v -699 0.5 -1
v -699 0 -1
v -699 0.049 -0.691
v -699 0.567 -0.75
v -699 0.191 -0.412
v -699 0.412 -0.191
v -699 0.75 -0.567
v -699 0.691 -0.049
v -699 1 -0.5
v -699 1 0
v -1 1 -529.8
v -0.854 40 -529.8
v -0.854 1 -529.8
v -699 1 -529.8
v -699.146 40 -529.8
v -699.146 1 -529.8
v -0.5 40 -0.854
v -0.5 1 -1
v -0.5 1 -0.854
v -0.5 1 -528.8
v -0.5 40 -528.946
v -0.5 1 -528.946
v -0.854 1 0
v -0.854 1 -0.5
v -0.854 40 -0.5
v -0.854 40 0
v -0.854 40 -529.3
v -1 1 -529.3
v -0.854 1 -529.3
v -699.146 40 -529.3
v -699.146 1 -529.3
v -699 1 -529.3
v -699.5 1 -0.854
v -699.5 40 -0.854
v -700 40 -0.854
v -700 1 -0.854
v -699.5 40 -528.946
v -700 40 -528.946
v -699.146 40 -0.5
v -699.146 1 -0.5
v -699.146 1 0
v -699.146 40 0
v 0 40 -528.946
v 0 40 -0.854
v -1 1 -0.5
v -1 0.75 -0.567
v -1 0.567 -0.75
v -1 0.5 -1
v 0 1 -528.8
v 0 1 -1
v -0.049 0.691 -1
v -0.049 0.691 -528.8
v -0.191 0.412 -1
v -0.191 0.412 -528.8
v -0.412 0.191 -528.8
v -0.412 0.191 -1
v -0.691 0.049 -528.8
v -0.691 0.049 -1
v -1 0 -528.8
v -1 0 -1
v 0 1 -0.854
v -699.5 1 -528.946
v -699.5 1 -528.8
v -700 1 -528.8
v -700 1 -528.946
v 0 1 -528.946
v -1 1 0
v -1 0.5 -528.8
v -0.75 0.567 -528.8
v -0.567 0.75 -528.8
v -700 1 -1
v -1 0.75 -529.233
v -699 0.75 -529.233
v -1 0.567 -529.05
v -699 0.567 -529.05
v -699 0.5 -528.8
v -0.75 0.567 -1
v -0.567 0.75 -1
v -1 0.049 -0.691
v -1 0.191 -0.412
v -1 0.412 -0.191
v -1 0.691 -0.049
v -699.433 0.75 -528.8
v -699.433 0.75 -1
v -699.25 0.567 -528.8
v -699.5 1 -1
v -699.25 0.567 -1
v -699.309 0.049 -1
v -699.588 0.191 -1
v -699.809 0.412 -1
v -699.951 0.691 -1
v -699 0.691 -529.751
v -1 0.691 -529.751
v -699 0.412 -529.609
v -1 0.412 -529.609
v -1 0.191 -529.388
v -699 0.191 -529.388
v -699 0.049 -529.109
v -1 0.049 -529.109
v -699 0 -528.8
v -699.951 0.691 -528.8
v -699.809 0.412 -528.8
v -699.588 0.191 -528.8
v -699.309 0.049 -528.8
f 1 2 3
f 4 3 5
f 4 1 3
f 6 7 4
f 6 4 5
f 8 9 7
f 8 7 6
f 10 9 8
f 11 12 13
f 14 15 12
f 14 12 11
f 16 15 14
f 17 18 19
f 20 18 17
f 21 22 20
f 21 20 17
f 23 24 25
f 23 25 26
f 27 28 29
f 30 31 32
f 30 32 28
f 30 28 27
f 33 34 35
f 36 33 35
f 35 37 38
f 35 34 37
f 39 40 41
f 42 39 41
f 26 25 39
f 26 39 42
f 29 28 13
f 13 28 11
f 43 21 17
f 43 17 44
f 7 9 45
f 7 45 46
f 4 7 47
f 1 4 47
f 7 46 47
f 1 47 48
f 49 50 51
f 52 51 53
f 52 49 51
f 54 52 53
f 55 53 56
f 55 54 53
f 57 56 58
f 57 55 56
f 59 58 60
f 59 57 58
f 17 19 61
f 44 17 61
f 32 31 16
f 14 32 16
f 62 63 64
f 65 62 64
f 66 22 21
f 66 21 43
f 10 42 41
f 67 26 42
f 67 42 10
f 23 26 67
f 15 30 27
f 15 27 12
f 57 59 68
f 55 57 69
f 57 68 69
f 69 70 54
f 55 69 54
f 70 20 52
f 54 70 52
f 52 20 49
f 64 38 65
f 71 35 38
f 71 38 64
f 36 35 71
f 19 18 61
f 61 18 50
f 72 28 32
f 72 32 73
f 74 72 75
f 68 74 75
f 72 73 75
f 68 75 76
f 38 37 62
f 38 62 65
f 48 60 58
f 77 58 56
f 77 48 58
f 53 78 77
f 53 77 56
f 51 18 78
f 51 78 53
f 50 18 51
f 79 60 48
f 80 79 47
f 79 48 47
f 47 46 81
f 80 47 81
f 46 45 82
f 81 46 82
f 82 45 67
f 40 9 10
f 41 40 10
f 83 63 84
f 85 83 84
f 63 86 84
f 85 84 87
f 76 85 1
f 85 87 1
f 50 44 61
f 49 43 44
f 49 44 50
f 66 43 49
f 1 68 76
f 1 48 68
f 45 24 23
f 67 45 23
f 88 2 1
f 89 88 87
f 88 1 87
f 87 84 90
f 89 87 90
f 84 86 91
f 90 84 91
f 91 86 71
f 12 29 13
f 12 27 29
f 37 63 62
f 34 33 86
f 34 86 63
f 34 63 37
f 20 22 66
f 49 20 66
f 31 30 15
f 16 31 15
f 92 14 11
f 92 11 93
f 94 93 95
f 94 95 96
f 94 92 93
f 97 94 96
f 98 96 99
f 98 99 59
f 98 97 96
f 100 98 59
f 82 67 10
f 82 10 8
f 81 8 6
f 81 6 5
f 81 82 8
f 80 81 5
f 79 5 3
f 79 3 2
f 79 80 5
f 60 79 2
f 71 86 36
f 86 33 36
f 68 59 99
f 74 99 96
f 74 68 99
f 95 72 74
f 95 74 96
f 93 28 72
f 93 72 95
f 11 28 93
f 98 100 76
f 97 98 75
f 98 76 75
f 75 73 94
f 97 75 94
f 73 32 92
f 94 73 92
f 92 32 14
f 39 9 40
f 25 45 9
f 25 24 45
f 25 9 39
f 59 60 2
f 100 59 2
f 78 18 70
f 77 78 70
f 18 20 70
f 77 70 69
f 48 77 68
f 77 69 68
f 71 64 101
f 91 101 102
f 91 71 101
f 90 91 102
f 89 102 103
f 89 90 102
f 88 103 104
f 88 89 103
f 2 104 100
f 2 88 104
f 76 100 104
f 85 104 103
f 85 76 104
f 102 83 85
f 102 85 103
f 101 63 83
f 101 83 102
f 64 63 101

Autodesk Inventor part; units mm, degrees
ref_plane "YZ Plane" through (0, 0, 0) normal (1, 0, 0) x (0, 1, 0)
ref_plane "XZ Plane" through (0, 0, 0) normal (0, 1, 0) x (-1, 0, 0)
ref_plane "XY Plane" through (0, 0, 0) normal (0, 0, 1) x (1, 0, 0)
sketch "Sketch1" plane through (0, 0, 0) normal (0, 1, 0) x (-1, 0, 0)
  line L0 (0, 0) -> (700, 0)
  line L1 (700, 0) -> (700, -529.8)
  line L2 (700, -529.8) -> (0, -529.8)
  line L3 (0, -529.8) -> (0, 0)
  dimension "d0" = 700
  dimension "d1" = 529.8
extrude "Plate1" add sketch "Sketch1" along normal blind 0.5
sketch "Sketch2" plane through (-700, 0, -529.3) normal (0, 0, -1) x (-1, 0, 0)
  line L0 (-700, 0) -> (0, 0)
  line L1 (0, 0) -> (0, 40)
  line L2 (0, 40) -> (-700, 40)
  line L3 (-700, 40) -> (-700, 0)
edge flange "Flange1" height 40 angle 90 thickness 0.5 bend radius 0.5 thickness toward (0, 0, -1) relief tear relief width 0.5 relief depth 0.25 corner gap 0.5 corner form 2 edges at (-350, 0.5, -529.8) (0, 0.5, -264.9) (-350, 0.5, 0) (-700, 0.5, -264.9) wall of the first edge with corners at (0, 0, -529.3) (-700, 0, -529.3) (-700, 40, -529.3) (0, 40, -529.3)
bend "Bend1"
corner "Corner1"
equation "\"d3\" = BendReliefWidth"
equation "\"d4\" = BendReliefDepth"
equation "\"d5\" = MinimumRemnant"
equation "\"d6\" = BendRadius"
equation "\"d9\" = BendRadius"
equation "\"d10\" = CornerReliefSize"
equation "\"d11\" = GapSize"
equation "\"d12\" = JacobiRadiusSize"
equation "\"BendRadius\" = Thickness"
equation "\"BendReliefWidth\" = Thickness"
equation "\"BendReliefDepth\" = 0.5 * Thickness"
equation "\"CornerReliefSize\" = 4 * Thickness"
equation "\"MinimumRemnant\" = 2 * Thickness"
equation "\"TransitionRadius\" = BendRadius"
equation "\"JacobiRadiusSize\" = BendRadius"
equation "\"GapSize\" = Thickness"
equation "\"d2\" = BendRadius"
equation "\"Thickness\" = 0.5"
properties part number "BeddingStopper"
